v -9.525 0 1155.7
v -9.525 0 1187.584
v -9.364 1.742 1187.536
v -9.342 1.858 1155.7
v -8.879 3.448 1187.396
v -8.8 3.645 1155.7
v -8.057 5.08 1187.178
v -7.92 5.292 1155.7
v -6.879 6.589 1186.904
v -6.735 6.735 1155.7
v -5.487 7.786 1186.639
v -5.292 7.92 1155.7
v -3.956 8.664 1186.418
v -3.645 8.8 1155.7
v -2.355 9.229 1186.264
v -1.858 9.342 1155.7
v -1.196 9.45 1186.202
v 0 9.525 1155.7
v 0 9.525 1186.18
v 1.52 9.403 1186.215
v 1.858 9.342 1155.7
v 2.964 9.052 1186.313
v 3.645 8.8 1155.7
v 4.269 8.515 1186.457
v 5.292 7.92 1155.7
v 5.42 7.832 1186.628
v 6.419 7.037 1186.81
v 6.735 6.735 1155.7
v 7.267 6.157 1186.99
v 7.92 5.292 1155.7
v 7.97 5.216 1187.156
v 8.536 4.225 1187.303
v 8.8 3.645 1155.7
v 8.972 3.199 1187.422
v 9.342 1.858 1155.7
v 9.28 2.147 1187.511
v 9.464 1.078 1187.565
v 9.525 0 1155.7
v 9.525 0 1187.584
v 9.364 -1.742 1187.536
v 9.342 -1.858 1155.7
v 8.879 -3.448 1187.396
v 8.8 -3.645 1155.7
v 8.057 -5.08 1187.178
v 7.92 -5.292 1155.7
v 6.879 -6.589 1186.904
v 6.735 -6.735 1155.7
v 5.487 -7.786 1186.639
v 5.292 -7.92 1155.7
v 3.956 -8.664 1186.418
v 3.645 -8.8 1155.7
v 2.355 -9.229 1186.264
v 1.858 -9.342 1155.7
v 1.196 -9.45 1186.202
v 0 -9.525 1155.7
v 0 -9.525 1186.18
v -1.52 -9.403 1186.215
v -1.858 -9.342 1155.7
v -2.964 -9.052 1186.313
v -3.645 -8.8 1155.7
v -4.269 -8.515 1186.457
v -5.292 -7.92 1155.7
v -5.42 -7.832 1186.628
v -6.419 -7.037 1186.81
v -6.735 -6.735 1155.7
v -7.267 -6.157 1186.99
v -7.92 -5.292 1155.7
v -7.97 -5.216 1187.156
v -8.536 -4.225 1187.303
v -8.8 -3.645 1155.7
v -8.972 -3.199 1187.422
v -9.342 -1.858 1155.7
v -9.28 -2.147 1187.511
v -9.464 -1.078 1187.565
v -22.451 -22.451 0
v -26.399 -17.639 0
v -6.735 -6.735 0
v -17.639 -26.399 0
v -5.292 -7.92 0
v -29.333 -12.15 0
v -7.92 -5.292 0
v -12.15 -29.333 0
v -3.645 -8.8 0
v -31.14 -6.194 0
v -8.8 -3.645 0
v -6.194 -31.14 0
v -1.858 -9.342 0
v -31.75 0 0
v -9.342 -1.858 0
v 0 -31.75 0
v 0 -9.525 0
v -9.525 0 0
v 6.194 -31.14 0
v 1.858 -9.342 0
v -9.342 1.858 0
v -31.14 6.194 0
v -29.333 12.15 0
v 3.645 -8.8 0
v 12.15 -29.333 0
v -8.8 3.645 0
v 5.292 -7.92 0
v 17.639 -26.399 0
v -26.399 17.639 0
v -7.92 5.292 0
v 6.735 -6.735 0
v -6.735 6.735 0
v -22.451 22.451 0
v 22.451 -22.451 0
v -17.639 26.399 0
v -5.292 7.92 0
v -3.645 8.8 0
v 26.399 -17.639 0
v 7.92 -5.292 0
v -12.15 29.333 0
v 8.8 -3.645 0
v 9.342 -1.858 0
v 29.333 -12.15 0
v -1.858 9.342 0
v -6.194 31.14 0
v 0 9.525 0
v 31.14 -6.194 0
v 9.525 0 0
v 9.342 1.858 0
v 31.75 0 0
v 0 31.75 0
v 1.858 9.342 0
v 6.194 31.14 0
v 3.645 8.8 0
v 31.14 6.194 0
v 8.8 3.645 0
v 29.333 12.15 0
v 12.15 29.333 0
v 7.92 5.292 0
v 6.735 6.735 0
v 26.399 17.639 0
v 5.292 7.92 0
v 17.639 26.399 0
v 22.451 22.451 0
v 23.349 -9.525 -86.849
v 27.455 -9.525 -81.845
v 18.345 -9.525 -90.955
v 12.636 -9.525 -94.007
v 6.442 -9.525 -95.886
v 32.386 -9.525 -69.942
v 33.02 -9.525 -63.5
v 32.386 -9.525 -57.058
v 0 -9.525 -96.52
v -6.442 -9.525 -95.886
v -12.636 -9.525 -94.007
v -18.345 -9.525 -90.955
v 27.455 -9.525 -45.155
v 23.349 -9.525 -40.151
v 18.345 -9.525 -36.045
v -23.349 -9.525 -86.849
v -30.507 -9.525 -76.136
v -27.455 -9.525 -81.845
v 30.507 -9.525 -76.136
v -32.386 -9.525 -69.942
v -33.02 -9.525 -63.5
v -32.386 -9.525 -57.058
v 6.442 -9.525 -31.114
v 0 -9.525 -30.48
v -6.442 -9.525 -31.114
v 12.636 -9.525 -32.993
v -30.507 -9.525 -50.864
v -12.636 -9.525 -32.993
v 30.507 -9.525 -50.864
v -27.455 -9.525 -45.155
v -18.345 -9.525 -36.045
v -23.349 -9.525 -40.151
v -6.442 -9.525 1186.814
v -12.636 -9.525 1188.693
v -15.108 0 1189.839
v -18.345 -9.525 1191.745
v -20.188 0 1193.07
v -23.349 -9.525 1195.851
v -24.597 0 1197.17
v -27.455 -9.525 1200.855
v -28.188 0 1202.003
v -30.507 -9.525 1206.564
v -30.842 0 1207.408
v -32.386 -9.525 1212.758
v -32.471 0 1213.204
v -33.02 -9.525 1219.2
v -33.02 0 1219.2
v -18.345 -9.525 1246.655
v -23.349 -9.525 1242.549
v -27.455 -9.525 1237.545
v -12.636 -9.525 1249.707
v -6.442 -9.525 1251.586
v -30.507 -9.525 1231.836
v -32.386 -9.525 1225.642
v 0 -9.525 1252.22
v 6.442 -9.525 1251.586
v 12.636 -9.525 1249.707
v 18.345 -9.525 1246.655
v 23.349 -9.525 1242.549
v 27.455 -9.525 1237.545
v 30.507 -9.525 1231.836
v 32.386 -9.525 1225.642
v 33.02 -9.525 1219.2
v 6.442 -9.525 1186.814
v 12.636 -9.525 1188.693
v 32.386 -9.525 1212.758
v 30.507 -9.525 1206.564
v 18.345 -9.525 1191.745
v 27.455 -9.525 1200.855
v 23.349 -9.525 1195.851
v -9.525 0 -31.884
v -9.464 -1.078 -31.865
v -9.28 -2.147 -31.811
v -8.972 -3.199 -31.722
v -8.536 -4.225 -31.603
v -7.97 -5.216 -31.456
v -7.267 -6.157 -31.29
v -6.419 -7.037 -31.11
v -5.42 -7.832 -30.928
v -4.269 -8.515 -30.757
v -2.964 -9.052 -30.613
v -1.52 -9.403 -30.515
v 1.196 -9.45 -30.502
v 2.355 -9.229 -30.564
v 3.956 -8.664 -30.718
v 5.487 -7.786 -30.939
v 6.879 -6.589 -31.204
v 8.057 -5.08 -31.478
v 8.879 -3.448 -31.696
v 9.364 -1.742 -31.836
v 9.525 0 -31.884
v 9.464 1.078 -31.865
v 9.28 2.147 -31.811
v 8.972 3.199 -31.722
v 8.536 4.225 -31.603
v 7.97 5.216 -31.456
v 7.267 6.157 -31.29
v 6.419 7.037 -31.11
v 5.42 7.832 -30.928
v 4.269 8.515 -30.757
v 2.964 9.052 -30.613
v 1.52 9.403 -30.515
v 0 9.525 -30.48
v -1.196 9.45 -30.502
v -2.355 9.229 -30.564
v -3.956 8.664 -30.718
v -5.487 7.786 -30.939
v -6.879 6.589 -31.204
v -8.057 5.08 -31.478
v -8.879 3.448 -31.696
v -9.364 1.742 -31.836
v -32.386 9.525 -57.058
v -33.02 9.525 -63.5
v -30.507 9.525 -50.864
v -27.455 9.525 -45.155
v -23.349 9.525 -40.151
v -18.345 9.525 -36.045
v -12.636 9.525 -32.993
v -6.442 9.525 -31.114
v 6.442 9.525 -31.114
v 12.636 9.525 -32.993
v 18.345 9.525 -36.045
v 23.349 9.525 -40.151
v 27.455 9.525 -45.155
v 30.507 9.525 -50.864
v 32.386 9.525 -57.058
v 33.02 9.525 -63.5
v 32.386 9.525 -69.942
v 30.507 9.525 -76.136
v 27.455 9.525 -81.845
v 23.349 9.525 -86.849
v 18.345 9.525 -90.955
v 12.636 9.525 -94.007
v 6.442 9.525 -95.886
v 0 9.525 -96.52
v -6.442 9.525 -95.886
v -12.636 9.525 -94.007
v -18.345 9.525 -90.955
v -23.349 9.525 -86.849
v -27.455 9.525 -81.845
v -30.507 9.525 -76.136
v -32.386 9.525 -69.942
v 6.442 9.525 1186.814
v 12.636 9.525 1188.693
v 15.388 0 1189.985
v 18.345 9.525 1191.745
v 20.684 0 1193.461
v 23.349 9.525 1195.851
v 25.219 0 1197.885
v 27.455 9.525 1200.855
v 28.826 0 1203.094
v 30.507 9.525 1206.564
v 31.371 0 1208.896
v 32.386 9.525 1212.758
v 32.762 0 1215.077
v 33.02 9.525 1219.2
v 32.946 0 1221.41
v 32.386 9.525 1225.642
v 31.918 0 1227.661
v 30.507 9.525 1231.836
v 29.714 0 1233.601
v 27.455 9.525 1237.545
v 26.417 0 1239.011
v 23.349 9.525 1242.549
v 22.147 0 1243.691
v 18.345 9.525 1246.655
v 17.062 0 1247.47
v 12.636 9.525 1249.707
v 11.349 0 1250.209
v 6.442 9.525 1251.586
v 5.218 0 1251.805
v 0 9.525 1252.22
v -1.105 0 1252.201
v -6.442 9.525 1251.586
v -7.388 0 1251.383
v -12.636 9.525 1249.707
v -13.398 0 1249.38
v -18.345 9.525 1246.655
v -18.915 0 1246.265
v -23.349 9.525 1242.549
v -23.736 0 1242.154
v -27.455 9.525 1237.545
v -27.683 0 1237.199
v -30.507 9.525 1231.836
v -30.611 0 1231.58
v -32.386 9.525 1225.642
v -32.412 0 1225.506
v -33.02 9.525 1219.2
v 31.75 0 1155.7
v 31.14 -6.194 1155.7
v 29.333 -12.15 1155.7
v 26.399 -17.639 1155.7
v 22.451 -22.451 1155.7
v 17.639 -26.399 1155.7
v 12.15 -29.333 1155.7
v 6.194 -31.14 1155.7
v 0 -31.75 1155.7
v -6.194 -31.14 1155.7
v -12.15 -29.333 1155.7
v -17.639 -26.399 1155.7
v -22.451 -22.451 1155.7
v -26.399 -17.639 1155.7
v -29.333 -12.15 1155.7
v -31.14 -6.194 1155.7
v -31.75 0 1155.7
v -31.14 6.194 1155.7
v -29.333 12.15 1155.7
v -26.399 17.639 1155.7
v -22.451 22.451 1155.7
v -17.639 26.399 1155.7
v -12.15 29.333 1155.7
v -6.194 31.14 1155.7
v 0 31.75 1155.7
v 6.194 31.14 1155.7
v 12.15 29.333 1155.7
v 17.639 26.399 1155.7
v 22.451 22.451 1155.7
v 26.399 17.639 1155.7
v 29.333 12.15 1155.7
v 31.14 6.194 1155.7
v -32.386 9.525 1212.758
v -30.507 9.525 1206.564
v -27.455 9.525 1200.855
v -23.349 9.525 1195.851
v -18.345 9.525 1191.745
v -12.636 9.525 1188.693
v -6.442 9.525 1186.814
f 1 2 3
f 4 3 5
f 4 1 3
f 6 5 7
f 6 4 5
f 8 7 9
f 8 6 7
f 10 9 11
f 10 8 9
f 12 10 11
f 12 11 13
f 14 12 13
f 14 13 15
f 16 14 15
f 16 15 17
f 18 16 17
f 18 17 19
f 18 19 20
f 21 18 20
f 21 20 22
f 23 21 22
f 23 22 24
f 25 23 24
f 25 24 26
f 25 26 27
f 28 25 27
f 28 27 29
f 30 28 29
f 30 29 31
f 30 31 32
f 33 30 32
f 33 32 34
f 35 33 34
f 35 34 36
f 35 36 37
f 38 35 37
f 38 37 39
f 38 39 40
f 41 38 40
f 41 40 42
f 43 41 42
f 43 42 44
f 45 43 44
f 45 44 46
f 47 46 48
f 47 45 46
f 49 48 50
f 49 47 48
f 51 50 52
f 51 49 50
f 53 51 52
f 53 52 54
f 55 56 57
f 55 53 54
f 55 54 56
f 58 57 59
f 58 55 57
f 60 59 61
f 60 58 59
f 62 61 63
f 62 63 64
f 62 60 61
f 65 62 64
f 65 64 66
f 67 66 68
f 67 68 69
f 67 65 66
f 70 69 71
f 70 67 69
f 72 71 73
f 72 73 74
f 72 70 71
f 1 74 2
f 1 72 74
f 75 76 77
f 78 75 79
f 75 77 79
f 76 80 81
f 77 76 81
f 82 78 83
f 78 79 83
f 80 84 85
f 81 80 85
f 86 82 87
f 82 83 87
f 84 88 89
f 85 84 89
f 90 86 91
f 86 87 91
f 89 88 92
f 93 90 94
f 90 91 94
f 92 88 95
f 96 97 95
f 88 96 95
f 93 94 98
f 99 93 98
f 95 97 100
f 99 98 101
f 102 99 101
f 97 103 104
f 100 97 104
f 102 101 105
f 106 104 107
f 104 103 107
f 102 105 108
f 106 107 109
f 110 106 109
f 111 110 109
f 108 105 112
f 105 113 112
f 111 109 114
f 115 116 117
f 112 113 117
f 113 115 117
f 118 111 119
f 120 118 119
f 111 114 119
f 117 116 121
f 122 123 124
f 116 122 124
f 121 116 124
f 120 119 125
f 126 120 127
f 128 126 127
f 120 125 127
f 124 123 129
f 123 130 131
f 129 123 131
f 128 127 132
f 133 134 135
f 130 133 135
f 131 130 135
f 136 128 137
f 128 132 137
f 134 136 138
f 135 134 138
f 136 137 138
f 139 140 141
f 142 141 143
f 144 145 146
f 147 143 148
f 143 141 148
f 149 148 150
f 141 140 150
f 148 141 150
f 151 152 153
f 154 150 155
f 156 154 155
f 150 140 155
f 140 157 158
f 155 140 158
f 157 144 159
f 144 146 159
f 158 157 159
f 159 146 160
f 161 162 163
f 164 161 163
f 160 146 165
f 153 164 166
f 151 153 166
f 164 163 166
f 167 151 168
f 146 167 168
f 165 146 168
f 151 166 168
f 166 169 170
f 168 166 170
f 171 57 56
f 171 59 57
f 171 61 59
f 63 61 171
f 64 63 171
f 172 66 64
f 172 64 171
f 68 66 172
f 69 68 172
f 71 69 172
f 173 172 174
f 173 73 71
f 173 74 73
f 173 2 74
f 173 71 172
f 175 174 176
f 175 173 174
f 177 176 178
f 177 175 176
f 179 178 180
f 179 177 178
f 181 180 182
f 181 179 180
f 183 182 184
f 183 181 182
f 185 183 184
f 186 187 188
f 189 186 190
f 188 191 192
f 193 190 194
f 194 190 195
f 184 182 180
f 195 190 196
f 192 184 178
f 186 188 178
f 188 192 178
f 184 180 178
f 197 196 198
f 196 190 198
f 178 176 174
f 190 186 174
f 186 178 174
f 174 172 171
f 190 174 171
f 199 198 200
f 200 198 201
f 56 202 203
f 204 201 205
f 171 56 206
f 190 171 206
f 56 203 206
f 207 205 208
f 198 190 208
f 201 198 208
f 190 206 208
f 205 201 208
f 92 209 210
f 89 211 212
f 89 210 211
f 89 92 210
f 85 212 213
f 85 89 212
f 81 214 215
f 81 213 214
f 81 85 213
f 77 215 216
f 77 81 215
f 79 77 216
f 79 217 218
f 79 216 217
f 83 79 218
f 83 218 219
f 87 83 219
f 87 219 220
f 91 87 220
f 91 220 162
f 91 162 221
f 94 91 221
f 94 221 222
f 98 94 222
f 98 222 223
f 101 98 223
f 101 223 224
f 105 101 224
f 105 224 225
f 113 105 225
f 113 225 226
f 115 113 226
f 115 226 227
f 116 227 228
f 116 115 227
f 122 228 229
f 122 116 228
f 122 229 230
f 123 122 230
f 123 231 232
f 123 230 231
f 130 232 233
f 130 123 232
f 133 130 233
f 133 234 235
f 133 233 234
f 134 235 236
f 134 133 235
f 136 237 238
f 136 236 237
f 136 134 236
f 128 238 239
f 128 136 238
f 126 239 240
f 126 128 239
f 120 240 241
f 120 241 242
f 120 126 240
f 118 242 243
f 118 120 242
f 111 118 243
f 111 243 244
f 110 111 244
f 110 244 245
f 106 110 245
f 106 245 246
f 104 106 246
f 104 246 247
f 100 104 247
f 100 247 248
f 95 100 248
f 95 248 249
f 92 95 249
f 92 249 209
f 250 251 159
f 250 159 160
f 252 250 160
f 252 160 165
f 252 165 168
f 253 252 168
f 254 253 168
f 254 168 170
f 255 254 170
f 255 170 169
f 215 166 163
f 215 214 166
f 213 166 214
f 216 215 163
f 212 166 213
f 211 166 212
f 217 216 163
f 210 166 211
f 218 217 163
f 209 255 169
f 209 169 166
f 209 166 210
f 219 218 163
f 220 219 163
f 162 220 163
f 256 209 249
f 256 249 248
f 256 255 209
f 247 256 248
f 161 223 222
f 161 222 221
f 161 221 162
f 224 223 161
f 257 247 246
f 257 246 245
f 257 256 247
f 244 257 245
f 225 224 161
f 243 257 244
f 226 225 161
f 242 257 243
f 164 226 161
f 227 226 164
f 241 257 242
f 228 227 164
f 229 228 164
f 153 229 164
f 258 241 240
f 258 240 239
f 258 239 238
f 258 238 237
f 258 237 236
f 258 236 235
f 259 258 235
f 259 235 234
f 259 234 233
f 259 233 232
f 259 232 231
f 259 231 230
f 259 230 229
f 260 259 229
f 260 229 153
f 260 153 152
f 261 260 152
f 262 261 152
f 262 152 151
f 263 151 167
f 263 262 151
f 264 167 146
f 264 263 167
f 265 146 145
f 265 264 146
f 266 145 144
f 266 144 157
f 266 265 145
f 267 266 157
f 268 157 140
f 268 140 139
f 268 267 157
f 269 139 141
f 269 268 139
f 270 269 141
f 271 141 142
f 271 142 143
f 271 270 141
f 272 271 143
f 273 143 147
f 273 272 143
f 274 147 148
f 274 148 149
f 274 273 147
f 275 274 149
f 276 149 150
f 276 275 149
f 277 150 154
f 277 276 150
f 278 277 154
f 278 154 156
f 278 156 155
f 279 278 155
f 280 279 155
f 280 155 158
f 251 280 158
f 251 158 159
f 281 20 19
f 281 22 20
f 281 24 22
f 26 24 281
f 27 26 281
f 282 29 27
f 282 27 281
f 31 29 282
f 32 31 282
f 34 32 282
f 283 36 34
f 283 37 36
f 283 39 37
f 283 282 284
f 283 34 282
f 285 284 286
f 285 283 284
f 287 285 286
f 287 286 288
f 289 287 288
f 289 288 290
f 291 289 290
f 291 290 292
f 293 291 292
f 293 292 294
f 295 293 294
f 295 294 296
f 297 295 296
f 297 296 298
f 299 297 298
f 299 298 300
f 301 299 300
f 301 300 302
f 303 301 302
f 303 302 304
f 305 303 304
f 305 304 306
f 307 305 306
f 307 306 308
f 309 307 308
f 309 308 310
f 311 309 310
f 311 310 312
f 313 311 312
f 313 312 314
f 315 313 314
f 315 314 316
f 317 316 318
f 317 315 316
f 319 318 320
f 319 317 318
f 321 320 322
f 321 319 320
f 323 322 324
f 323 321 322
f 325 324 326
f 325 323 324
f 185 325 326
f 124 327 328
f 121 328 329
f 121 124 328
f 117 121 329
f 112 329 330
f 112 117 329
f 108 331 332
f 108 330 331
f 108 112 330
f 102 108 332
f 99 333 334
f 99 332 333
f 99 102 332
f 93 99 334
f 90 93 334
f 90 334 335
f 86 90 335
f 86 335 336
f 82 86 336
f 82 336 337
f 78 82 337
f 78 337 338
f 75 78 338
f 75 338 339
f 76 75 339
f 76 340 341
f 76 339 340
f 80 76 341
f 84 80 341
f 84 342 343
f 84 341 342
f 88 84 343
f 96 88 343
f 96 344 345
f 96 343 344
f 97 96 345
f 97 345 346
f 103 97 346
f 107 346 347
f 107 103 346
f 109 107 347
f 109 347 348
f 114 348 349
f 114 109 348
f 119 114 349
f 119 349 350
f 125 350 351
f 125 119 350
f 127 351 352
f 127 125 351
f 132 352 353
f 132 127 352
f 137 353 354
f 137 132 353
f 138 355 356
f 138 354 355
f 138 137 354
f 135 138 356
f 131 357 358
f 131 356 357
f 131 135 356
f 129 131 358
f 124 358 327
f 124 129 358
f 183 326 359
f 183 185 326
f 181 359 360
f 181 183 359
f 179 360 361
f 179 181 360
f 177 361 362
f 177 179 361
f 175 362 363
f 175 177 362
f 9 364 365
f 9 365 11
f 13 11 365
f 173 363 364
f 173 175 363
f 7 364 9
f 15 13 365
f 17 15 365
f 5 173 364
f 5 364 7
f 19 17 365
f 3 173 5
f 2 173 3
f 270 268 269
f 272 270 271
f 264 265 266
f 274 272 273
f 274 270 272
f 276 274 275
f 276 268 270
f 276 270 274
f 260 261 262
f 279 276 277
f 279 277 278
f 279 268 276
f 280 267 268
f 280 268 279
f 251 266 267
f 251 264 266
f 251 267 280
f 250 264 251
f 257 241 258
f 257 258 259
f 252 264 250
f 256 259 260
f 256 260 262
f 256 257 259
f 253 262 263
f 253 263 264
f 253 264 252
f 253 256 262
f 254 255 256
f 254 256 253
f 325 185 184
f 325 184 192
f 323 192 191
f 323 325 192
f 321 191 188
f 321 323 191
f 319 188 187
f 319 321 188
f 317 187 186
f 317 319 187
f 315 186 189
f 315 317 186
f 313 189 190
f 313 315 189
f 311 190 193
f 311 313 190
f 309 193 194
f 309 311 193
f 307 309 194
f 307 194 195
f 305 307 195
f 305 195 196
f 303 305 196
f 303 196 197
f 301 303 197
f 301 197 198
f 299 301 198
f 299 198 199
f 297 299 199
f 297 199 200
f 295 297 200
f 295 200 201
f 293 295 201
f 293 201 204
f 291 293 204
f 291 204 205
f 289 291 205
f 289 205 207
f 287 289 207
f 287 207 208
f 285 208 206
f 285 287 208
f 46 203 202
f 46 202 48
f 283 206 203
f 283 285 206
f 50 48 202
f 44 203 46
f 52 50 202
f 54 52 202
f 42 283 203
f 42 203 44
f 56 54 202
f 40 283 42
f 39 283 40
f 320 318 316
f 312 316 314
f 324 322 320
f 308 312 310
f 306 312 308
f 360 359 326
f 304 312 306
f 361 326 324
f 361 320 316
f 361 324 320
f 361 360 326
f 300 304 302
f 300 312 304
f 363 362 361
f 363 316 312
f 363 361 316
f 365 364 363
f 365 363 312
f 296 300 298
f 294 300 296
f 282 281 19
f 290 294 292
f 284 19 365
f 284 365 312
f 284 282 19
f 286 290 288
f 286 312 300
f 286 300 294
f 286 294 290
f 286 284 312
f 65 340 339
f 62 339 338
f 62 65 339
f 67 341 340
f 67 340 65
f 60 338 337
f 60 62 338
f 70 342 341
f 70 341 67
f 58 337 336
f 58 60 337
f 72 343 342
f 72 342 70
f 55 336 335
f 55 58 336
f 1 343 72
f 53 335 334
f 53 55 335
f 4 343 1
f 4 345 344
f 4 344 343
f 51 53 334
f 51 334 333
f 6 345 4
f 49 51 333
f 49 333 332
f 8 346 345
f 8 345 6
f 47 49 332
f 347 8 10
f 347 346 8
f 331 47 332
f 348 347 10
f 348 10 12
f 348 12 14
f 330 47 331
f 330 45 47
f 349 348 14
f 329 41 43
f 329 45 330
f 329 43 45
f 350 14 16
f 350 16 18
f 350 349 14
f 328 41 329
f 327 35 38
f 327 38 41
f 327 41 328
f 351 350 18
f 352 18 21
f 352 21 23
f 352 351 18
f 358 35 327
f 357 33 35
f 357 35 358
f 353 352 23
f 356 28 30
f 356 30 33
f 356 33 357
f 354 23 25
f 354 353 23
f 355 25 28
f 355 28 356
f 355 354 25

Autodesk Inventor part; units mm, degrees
ref_plane "YZ Plane" through (0, 0, 0) normal (1, 0, 0) x (0, 1, 0)
ref_plane "XZ Plane" through (0, 0, 0) normal (0, 1, 0) x (-1, 0, 0)
sketch "Sketch1" plane through (0, 0, 0) normal (0, 0, 1) x (1, 0, 0)
  circle A0 centre (0, 0) radius 31.75
  dimension "d0" = 63.5
extrude "Extrusion1" add sketch "Sketch1" along normal blind 1155.7
sketch "Sketch2" plane through (0, 0, 0) normal (0, 0, -1) x (-1, 0, 0)
  circle A0 centre (0, 0) radius 9.525
  dimension "d3" = 19.05
extrude "Extrusion2" add sketch "Sketch2" along normal blind 50.8
sketch "Sketch3" plane through (0, 0, 0) normal (0, 1, 0) x (-1, 0, 0)
  circle A0 centre (0, -63.5) radius 33.02
  line L0 (31.75, 0) -> (-31.75, 0) projected
  point P0 (0, 0)
  dimension "d6" = 63.5
  dimension "d7" = 66.04
extrude "Extrusion3" add sketch "Sketch3" along normal mid plane 19.05
ref_plane "Work Plane1" through (0, 0, 577.85) normal (0, 0, -1) x (-1, 0, 0)
mirror "Mirror1" about plane through (0, 0, 577.85) normal (0, 0, -1) of "Extrusion3", "Extrusion2"
properties part number "driveshaft_m_mount_shaft"
